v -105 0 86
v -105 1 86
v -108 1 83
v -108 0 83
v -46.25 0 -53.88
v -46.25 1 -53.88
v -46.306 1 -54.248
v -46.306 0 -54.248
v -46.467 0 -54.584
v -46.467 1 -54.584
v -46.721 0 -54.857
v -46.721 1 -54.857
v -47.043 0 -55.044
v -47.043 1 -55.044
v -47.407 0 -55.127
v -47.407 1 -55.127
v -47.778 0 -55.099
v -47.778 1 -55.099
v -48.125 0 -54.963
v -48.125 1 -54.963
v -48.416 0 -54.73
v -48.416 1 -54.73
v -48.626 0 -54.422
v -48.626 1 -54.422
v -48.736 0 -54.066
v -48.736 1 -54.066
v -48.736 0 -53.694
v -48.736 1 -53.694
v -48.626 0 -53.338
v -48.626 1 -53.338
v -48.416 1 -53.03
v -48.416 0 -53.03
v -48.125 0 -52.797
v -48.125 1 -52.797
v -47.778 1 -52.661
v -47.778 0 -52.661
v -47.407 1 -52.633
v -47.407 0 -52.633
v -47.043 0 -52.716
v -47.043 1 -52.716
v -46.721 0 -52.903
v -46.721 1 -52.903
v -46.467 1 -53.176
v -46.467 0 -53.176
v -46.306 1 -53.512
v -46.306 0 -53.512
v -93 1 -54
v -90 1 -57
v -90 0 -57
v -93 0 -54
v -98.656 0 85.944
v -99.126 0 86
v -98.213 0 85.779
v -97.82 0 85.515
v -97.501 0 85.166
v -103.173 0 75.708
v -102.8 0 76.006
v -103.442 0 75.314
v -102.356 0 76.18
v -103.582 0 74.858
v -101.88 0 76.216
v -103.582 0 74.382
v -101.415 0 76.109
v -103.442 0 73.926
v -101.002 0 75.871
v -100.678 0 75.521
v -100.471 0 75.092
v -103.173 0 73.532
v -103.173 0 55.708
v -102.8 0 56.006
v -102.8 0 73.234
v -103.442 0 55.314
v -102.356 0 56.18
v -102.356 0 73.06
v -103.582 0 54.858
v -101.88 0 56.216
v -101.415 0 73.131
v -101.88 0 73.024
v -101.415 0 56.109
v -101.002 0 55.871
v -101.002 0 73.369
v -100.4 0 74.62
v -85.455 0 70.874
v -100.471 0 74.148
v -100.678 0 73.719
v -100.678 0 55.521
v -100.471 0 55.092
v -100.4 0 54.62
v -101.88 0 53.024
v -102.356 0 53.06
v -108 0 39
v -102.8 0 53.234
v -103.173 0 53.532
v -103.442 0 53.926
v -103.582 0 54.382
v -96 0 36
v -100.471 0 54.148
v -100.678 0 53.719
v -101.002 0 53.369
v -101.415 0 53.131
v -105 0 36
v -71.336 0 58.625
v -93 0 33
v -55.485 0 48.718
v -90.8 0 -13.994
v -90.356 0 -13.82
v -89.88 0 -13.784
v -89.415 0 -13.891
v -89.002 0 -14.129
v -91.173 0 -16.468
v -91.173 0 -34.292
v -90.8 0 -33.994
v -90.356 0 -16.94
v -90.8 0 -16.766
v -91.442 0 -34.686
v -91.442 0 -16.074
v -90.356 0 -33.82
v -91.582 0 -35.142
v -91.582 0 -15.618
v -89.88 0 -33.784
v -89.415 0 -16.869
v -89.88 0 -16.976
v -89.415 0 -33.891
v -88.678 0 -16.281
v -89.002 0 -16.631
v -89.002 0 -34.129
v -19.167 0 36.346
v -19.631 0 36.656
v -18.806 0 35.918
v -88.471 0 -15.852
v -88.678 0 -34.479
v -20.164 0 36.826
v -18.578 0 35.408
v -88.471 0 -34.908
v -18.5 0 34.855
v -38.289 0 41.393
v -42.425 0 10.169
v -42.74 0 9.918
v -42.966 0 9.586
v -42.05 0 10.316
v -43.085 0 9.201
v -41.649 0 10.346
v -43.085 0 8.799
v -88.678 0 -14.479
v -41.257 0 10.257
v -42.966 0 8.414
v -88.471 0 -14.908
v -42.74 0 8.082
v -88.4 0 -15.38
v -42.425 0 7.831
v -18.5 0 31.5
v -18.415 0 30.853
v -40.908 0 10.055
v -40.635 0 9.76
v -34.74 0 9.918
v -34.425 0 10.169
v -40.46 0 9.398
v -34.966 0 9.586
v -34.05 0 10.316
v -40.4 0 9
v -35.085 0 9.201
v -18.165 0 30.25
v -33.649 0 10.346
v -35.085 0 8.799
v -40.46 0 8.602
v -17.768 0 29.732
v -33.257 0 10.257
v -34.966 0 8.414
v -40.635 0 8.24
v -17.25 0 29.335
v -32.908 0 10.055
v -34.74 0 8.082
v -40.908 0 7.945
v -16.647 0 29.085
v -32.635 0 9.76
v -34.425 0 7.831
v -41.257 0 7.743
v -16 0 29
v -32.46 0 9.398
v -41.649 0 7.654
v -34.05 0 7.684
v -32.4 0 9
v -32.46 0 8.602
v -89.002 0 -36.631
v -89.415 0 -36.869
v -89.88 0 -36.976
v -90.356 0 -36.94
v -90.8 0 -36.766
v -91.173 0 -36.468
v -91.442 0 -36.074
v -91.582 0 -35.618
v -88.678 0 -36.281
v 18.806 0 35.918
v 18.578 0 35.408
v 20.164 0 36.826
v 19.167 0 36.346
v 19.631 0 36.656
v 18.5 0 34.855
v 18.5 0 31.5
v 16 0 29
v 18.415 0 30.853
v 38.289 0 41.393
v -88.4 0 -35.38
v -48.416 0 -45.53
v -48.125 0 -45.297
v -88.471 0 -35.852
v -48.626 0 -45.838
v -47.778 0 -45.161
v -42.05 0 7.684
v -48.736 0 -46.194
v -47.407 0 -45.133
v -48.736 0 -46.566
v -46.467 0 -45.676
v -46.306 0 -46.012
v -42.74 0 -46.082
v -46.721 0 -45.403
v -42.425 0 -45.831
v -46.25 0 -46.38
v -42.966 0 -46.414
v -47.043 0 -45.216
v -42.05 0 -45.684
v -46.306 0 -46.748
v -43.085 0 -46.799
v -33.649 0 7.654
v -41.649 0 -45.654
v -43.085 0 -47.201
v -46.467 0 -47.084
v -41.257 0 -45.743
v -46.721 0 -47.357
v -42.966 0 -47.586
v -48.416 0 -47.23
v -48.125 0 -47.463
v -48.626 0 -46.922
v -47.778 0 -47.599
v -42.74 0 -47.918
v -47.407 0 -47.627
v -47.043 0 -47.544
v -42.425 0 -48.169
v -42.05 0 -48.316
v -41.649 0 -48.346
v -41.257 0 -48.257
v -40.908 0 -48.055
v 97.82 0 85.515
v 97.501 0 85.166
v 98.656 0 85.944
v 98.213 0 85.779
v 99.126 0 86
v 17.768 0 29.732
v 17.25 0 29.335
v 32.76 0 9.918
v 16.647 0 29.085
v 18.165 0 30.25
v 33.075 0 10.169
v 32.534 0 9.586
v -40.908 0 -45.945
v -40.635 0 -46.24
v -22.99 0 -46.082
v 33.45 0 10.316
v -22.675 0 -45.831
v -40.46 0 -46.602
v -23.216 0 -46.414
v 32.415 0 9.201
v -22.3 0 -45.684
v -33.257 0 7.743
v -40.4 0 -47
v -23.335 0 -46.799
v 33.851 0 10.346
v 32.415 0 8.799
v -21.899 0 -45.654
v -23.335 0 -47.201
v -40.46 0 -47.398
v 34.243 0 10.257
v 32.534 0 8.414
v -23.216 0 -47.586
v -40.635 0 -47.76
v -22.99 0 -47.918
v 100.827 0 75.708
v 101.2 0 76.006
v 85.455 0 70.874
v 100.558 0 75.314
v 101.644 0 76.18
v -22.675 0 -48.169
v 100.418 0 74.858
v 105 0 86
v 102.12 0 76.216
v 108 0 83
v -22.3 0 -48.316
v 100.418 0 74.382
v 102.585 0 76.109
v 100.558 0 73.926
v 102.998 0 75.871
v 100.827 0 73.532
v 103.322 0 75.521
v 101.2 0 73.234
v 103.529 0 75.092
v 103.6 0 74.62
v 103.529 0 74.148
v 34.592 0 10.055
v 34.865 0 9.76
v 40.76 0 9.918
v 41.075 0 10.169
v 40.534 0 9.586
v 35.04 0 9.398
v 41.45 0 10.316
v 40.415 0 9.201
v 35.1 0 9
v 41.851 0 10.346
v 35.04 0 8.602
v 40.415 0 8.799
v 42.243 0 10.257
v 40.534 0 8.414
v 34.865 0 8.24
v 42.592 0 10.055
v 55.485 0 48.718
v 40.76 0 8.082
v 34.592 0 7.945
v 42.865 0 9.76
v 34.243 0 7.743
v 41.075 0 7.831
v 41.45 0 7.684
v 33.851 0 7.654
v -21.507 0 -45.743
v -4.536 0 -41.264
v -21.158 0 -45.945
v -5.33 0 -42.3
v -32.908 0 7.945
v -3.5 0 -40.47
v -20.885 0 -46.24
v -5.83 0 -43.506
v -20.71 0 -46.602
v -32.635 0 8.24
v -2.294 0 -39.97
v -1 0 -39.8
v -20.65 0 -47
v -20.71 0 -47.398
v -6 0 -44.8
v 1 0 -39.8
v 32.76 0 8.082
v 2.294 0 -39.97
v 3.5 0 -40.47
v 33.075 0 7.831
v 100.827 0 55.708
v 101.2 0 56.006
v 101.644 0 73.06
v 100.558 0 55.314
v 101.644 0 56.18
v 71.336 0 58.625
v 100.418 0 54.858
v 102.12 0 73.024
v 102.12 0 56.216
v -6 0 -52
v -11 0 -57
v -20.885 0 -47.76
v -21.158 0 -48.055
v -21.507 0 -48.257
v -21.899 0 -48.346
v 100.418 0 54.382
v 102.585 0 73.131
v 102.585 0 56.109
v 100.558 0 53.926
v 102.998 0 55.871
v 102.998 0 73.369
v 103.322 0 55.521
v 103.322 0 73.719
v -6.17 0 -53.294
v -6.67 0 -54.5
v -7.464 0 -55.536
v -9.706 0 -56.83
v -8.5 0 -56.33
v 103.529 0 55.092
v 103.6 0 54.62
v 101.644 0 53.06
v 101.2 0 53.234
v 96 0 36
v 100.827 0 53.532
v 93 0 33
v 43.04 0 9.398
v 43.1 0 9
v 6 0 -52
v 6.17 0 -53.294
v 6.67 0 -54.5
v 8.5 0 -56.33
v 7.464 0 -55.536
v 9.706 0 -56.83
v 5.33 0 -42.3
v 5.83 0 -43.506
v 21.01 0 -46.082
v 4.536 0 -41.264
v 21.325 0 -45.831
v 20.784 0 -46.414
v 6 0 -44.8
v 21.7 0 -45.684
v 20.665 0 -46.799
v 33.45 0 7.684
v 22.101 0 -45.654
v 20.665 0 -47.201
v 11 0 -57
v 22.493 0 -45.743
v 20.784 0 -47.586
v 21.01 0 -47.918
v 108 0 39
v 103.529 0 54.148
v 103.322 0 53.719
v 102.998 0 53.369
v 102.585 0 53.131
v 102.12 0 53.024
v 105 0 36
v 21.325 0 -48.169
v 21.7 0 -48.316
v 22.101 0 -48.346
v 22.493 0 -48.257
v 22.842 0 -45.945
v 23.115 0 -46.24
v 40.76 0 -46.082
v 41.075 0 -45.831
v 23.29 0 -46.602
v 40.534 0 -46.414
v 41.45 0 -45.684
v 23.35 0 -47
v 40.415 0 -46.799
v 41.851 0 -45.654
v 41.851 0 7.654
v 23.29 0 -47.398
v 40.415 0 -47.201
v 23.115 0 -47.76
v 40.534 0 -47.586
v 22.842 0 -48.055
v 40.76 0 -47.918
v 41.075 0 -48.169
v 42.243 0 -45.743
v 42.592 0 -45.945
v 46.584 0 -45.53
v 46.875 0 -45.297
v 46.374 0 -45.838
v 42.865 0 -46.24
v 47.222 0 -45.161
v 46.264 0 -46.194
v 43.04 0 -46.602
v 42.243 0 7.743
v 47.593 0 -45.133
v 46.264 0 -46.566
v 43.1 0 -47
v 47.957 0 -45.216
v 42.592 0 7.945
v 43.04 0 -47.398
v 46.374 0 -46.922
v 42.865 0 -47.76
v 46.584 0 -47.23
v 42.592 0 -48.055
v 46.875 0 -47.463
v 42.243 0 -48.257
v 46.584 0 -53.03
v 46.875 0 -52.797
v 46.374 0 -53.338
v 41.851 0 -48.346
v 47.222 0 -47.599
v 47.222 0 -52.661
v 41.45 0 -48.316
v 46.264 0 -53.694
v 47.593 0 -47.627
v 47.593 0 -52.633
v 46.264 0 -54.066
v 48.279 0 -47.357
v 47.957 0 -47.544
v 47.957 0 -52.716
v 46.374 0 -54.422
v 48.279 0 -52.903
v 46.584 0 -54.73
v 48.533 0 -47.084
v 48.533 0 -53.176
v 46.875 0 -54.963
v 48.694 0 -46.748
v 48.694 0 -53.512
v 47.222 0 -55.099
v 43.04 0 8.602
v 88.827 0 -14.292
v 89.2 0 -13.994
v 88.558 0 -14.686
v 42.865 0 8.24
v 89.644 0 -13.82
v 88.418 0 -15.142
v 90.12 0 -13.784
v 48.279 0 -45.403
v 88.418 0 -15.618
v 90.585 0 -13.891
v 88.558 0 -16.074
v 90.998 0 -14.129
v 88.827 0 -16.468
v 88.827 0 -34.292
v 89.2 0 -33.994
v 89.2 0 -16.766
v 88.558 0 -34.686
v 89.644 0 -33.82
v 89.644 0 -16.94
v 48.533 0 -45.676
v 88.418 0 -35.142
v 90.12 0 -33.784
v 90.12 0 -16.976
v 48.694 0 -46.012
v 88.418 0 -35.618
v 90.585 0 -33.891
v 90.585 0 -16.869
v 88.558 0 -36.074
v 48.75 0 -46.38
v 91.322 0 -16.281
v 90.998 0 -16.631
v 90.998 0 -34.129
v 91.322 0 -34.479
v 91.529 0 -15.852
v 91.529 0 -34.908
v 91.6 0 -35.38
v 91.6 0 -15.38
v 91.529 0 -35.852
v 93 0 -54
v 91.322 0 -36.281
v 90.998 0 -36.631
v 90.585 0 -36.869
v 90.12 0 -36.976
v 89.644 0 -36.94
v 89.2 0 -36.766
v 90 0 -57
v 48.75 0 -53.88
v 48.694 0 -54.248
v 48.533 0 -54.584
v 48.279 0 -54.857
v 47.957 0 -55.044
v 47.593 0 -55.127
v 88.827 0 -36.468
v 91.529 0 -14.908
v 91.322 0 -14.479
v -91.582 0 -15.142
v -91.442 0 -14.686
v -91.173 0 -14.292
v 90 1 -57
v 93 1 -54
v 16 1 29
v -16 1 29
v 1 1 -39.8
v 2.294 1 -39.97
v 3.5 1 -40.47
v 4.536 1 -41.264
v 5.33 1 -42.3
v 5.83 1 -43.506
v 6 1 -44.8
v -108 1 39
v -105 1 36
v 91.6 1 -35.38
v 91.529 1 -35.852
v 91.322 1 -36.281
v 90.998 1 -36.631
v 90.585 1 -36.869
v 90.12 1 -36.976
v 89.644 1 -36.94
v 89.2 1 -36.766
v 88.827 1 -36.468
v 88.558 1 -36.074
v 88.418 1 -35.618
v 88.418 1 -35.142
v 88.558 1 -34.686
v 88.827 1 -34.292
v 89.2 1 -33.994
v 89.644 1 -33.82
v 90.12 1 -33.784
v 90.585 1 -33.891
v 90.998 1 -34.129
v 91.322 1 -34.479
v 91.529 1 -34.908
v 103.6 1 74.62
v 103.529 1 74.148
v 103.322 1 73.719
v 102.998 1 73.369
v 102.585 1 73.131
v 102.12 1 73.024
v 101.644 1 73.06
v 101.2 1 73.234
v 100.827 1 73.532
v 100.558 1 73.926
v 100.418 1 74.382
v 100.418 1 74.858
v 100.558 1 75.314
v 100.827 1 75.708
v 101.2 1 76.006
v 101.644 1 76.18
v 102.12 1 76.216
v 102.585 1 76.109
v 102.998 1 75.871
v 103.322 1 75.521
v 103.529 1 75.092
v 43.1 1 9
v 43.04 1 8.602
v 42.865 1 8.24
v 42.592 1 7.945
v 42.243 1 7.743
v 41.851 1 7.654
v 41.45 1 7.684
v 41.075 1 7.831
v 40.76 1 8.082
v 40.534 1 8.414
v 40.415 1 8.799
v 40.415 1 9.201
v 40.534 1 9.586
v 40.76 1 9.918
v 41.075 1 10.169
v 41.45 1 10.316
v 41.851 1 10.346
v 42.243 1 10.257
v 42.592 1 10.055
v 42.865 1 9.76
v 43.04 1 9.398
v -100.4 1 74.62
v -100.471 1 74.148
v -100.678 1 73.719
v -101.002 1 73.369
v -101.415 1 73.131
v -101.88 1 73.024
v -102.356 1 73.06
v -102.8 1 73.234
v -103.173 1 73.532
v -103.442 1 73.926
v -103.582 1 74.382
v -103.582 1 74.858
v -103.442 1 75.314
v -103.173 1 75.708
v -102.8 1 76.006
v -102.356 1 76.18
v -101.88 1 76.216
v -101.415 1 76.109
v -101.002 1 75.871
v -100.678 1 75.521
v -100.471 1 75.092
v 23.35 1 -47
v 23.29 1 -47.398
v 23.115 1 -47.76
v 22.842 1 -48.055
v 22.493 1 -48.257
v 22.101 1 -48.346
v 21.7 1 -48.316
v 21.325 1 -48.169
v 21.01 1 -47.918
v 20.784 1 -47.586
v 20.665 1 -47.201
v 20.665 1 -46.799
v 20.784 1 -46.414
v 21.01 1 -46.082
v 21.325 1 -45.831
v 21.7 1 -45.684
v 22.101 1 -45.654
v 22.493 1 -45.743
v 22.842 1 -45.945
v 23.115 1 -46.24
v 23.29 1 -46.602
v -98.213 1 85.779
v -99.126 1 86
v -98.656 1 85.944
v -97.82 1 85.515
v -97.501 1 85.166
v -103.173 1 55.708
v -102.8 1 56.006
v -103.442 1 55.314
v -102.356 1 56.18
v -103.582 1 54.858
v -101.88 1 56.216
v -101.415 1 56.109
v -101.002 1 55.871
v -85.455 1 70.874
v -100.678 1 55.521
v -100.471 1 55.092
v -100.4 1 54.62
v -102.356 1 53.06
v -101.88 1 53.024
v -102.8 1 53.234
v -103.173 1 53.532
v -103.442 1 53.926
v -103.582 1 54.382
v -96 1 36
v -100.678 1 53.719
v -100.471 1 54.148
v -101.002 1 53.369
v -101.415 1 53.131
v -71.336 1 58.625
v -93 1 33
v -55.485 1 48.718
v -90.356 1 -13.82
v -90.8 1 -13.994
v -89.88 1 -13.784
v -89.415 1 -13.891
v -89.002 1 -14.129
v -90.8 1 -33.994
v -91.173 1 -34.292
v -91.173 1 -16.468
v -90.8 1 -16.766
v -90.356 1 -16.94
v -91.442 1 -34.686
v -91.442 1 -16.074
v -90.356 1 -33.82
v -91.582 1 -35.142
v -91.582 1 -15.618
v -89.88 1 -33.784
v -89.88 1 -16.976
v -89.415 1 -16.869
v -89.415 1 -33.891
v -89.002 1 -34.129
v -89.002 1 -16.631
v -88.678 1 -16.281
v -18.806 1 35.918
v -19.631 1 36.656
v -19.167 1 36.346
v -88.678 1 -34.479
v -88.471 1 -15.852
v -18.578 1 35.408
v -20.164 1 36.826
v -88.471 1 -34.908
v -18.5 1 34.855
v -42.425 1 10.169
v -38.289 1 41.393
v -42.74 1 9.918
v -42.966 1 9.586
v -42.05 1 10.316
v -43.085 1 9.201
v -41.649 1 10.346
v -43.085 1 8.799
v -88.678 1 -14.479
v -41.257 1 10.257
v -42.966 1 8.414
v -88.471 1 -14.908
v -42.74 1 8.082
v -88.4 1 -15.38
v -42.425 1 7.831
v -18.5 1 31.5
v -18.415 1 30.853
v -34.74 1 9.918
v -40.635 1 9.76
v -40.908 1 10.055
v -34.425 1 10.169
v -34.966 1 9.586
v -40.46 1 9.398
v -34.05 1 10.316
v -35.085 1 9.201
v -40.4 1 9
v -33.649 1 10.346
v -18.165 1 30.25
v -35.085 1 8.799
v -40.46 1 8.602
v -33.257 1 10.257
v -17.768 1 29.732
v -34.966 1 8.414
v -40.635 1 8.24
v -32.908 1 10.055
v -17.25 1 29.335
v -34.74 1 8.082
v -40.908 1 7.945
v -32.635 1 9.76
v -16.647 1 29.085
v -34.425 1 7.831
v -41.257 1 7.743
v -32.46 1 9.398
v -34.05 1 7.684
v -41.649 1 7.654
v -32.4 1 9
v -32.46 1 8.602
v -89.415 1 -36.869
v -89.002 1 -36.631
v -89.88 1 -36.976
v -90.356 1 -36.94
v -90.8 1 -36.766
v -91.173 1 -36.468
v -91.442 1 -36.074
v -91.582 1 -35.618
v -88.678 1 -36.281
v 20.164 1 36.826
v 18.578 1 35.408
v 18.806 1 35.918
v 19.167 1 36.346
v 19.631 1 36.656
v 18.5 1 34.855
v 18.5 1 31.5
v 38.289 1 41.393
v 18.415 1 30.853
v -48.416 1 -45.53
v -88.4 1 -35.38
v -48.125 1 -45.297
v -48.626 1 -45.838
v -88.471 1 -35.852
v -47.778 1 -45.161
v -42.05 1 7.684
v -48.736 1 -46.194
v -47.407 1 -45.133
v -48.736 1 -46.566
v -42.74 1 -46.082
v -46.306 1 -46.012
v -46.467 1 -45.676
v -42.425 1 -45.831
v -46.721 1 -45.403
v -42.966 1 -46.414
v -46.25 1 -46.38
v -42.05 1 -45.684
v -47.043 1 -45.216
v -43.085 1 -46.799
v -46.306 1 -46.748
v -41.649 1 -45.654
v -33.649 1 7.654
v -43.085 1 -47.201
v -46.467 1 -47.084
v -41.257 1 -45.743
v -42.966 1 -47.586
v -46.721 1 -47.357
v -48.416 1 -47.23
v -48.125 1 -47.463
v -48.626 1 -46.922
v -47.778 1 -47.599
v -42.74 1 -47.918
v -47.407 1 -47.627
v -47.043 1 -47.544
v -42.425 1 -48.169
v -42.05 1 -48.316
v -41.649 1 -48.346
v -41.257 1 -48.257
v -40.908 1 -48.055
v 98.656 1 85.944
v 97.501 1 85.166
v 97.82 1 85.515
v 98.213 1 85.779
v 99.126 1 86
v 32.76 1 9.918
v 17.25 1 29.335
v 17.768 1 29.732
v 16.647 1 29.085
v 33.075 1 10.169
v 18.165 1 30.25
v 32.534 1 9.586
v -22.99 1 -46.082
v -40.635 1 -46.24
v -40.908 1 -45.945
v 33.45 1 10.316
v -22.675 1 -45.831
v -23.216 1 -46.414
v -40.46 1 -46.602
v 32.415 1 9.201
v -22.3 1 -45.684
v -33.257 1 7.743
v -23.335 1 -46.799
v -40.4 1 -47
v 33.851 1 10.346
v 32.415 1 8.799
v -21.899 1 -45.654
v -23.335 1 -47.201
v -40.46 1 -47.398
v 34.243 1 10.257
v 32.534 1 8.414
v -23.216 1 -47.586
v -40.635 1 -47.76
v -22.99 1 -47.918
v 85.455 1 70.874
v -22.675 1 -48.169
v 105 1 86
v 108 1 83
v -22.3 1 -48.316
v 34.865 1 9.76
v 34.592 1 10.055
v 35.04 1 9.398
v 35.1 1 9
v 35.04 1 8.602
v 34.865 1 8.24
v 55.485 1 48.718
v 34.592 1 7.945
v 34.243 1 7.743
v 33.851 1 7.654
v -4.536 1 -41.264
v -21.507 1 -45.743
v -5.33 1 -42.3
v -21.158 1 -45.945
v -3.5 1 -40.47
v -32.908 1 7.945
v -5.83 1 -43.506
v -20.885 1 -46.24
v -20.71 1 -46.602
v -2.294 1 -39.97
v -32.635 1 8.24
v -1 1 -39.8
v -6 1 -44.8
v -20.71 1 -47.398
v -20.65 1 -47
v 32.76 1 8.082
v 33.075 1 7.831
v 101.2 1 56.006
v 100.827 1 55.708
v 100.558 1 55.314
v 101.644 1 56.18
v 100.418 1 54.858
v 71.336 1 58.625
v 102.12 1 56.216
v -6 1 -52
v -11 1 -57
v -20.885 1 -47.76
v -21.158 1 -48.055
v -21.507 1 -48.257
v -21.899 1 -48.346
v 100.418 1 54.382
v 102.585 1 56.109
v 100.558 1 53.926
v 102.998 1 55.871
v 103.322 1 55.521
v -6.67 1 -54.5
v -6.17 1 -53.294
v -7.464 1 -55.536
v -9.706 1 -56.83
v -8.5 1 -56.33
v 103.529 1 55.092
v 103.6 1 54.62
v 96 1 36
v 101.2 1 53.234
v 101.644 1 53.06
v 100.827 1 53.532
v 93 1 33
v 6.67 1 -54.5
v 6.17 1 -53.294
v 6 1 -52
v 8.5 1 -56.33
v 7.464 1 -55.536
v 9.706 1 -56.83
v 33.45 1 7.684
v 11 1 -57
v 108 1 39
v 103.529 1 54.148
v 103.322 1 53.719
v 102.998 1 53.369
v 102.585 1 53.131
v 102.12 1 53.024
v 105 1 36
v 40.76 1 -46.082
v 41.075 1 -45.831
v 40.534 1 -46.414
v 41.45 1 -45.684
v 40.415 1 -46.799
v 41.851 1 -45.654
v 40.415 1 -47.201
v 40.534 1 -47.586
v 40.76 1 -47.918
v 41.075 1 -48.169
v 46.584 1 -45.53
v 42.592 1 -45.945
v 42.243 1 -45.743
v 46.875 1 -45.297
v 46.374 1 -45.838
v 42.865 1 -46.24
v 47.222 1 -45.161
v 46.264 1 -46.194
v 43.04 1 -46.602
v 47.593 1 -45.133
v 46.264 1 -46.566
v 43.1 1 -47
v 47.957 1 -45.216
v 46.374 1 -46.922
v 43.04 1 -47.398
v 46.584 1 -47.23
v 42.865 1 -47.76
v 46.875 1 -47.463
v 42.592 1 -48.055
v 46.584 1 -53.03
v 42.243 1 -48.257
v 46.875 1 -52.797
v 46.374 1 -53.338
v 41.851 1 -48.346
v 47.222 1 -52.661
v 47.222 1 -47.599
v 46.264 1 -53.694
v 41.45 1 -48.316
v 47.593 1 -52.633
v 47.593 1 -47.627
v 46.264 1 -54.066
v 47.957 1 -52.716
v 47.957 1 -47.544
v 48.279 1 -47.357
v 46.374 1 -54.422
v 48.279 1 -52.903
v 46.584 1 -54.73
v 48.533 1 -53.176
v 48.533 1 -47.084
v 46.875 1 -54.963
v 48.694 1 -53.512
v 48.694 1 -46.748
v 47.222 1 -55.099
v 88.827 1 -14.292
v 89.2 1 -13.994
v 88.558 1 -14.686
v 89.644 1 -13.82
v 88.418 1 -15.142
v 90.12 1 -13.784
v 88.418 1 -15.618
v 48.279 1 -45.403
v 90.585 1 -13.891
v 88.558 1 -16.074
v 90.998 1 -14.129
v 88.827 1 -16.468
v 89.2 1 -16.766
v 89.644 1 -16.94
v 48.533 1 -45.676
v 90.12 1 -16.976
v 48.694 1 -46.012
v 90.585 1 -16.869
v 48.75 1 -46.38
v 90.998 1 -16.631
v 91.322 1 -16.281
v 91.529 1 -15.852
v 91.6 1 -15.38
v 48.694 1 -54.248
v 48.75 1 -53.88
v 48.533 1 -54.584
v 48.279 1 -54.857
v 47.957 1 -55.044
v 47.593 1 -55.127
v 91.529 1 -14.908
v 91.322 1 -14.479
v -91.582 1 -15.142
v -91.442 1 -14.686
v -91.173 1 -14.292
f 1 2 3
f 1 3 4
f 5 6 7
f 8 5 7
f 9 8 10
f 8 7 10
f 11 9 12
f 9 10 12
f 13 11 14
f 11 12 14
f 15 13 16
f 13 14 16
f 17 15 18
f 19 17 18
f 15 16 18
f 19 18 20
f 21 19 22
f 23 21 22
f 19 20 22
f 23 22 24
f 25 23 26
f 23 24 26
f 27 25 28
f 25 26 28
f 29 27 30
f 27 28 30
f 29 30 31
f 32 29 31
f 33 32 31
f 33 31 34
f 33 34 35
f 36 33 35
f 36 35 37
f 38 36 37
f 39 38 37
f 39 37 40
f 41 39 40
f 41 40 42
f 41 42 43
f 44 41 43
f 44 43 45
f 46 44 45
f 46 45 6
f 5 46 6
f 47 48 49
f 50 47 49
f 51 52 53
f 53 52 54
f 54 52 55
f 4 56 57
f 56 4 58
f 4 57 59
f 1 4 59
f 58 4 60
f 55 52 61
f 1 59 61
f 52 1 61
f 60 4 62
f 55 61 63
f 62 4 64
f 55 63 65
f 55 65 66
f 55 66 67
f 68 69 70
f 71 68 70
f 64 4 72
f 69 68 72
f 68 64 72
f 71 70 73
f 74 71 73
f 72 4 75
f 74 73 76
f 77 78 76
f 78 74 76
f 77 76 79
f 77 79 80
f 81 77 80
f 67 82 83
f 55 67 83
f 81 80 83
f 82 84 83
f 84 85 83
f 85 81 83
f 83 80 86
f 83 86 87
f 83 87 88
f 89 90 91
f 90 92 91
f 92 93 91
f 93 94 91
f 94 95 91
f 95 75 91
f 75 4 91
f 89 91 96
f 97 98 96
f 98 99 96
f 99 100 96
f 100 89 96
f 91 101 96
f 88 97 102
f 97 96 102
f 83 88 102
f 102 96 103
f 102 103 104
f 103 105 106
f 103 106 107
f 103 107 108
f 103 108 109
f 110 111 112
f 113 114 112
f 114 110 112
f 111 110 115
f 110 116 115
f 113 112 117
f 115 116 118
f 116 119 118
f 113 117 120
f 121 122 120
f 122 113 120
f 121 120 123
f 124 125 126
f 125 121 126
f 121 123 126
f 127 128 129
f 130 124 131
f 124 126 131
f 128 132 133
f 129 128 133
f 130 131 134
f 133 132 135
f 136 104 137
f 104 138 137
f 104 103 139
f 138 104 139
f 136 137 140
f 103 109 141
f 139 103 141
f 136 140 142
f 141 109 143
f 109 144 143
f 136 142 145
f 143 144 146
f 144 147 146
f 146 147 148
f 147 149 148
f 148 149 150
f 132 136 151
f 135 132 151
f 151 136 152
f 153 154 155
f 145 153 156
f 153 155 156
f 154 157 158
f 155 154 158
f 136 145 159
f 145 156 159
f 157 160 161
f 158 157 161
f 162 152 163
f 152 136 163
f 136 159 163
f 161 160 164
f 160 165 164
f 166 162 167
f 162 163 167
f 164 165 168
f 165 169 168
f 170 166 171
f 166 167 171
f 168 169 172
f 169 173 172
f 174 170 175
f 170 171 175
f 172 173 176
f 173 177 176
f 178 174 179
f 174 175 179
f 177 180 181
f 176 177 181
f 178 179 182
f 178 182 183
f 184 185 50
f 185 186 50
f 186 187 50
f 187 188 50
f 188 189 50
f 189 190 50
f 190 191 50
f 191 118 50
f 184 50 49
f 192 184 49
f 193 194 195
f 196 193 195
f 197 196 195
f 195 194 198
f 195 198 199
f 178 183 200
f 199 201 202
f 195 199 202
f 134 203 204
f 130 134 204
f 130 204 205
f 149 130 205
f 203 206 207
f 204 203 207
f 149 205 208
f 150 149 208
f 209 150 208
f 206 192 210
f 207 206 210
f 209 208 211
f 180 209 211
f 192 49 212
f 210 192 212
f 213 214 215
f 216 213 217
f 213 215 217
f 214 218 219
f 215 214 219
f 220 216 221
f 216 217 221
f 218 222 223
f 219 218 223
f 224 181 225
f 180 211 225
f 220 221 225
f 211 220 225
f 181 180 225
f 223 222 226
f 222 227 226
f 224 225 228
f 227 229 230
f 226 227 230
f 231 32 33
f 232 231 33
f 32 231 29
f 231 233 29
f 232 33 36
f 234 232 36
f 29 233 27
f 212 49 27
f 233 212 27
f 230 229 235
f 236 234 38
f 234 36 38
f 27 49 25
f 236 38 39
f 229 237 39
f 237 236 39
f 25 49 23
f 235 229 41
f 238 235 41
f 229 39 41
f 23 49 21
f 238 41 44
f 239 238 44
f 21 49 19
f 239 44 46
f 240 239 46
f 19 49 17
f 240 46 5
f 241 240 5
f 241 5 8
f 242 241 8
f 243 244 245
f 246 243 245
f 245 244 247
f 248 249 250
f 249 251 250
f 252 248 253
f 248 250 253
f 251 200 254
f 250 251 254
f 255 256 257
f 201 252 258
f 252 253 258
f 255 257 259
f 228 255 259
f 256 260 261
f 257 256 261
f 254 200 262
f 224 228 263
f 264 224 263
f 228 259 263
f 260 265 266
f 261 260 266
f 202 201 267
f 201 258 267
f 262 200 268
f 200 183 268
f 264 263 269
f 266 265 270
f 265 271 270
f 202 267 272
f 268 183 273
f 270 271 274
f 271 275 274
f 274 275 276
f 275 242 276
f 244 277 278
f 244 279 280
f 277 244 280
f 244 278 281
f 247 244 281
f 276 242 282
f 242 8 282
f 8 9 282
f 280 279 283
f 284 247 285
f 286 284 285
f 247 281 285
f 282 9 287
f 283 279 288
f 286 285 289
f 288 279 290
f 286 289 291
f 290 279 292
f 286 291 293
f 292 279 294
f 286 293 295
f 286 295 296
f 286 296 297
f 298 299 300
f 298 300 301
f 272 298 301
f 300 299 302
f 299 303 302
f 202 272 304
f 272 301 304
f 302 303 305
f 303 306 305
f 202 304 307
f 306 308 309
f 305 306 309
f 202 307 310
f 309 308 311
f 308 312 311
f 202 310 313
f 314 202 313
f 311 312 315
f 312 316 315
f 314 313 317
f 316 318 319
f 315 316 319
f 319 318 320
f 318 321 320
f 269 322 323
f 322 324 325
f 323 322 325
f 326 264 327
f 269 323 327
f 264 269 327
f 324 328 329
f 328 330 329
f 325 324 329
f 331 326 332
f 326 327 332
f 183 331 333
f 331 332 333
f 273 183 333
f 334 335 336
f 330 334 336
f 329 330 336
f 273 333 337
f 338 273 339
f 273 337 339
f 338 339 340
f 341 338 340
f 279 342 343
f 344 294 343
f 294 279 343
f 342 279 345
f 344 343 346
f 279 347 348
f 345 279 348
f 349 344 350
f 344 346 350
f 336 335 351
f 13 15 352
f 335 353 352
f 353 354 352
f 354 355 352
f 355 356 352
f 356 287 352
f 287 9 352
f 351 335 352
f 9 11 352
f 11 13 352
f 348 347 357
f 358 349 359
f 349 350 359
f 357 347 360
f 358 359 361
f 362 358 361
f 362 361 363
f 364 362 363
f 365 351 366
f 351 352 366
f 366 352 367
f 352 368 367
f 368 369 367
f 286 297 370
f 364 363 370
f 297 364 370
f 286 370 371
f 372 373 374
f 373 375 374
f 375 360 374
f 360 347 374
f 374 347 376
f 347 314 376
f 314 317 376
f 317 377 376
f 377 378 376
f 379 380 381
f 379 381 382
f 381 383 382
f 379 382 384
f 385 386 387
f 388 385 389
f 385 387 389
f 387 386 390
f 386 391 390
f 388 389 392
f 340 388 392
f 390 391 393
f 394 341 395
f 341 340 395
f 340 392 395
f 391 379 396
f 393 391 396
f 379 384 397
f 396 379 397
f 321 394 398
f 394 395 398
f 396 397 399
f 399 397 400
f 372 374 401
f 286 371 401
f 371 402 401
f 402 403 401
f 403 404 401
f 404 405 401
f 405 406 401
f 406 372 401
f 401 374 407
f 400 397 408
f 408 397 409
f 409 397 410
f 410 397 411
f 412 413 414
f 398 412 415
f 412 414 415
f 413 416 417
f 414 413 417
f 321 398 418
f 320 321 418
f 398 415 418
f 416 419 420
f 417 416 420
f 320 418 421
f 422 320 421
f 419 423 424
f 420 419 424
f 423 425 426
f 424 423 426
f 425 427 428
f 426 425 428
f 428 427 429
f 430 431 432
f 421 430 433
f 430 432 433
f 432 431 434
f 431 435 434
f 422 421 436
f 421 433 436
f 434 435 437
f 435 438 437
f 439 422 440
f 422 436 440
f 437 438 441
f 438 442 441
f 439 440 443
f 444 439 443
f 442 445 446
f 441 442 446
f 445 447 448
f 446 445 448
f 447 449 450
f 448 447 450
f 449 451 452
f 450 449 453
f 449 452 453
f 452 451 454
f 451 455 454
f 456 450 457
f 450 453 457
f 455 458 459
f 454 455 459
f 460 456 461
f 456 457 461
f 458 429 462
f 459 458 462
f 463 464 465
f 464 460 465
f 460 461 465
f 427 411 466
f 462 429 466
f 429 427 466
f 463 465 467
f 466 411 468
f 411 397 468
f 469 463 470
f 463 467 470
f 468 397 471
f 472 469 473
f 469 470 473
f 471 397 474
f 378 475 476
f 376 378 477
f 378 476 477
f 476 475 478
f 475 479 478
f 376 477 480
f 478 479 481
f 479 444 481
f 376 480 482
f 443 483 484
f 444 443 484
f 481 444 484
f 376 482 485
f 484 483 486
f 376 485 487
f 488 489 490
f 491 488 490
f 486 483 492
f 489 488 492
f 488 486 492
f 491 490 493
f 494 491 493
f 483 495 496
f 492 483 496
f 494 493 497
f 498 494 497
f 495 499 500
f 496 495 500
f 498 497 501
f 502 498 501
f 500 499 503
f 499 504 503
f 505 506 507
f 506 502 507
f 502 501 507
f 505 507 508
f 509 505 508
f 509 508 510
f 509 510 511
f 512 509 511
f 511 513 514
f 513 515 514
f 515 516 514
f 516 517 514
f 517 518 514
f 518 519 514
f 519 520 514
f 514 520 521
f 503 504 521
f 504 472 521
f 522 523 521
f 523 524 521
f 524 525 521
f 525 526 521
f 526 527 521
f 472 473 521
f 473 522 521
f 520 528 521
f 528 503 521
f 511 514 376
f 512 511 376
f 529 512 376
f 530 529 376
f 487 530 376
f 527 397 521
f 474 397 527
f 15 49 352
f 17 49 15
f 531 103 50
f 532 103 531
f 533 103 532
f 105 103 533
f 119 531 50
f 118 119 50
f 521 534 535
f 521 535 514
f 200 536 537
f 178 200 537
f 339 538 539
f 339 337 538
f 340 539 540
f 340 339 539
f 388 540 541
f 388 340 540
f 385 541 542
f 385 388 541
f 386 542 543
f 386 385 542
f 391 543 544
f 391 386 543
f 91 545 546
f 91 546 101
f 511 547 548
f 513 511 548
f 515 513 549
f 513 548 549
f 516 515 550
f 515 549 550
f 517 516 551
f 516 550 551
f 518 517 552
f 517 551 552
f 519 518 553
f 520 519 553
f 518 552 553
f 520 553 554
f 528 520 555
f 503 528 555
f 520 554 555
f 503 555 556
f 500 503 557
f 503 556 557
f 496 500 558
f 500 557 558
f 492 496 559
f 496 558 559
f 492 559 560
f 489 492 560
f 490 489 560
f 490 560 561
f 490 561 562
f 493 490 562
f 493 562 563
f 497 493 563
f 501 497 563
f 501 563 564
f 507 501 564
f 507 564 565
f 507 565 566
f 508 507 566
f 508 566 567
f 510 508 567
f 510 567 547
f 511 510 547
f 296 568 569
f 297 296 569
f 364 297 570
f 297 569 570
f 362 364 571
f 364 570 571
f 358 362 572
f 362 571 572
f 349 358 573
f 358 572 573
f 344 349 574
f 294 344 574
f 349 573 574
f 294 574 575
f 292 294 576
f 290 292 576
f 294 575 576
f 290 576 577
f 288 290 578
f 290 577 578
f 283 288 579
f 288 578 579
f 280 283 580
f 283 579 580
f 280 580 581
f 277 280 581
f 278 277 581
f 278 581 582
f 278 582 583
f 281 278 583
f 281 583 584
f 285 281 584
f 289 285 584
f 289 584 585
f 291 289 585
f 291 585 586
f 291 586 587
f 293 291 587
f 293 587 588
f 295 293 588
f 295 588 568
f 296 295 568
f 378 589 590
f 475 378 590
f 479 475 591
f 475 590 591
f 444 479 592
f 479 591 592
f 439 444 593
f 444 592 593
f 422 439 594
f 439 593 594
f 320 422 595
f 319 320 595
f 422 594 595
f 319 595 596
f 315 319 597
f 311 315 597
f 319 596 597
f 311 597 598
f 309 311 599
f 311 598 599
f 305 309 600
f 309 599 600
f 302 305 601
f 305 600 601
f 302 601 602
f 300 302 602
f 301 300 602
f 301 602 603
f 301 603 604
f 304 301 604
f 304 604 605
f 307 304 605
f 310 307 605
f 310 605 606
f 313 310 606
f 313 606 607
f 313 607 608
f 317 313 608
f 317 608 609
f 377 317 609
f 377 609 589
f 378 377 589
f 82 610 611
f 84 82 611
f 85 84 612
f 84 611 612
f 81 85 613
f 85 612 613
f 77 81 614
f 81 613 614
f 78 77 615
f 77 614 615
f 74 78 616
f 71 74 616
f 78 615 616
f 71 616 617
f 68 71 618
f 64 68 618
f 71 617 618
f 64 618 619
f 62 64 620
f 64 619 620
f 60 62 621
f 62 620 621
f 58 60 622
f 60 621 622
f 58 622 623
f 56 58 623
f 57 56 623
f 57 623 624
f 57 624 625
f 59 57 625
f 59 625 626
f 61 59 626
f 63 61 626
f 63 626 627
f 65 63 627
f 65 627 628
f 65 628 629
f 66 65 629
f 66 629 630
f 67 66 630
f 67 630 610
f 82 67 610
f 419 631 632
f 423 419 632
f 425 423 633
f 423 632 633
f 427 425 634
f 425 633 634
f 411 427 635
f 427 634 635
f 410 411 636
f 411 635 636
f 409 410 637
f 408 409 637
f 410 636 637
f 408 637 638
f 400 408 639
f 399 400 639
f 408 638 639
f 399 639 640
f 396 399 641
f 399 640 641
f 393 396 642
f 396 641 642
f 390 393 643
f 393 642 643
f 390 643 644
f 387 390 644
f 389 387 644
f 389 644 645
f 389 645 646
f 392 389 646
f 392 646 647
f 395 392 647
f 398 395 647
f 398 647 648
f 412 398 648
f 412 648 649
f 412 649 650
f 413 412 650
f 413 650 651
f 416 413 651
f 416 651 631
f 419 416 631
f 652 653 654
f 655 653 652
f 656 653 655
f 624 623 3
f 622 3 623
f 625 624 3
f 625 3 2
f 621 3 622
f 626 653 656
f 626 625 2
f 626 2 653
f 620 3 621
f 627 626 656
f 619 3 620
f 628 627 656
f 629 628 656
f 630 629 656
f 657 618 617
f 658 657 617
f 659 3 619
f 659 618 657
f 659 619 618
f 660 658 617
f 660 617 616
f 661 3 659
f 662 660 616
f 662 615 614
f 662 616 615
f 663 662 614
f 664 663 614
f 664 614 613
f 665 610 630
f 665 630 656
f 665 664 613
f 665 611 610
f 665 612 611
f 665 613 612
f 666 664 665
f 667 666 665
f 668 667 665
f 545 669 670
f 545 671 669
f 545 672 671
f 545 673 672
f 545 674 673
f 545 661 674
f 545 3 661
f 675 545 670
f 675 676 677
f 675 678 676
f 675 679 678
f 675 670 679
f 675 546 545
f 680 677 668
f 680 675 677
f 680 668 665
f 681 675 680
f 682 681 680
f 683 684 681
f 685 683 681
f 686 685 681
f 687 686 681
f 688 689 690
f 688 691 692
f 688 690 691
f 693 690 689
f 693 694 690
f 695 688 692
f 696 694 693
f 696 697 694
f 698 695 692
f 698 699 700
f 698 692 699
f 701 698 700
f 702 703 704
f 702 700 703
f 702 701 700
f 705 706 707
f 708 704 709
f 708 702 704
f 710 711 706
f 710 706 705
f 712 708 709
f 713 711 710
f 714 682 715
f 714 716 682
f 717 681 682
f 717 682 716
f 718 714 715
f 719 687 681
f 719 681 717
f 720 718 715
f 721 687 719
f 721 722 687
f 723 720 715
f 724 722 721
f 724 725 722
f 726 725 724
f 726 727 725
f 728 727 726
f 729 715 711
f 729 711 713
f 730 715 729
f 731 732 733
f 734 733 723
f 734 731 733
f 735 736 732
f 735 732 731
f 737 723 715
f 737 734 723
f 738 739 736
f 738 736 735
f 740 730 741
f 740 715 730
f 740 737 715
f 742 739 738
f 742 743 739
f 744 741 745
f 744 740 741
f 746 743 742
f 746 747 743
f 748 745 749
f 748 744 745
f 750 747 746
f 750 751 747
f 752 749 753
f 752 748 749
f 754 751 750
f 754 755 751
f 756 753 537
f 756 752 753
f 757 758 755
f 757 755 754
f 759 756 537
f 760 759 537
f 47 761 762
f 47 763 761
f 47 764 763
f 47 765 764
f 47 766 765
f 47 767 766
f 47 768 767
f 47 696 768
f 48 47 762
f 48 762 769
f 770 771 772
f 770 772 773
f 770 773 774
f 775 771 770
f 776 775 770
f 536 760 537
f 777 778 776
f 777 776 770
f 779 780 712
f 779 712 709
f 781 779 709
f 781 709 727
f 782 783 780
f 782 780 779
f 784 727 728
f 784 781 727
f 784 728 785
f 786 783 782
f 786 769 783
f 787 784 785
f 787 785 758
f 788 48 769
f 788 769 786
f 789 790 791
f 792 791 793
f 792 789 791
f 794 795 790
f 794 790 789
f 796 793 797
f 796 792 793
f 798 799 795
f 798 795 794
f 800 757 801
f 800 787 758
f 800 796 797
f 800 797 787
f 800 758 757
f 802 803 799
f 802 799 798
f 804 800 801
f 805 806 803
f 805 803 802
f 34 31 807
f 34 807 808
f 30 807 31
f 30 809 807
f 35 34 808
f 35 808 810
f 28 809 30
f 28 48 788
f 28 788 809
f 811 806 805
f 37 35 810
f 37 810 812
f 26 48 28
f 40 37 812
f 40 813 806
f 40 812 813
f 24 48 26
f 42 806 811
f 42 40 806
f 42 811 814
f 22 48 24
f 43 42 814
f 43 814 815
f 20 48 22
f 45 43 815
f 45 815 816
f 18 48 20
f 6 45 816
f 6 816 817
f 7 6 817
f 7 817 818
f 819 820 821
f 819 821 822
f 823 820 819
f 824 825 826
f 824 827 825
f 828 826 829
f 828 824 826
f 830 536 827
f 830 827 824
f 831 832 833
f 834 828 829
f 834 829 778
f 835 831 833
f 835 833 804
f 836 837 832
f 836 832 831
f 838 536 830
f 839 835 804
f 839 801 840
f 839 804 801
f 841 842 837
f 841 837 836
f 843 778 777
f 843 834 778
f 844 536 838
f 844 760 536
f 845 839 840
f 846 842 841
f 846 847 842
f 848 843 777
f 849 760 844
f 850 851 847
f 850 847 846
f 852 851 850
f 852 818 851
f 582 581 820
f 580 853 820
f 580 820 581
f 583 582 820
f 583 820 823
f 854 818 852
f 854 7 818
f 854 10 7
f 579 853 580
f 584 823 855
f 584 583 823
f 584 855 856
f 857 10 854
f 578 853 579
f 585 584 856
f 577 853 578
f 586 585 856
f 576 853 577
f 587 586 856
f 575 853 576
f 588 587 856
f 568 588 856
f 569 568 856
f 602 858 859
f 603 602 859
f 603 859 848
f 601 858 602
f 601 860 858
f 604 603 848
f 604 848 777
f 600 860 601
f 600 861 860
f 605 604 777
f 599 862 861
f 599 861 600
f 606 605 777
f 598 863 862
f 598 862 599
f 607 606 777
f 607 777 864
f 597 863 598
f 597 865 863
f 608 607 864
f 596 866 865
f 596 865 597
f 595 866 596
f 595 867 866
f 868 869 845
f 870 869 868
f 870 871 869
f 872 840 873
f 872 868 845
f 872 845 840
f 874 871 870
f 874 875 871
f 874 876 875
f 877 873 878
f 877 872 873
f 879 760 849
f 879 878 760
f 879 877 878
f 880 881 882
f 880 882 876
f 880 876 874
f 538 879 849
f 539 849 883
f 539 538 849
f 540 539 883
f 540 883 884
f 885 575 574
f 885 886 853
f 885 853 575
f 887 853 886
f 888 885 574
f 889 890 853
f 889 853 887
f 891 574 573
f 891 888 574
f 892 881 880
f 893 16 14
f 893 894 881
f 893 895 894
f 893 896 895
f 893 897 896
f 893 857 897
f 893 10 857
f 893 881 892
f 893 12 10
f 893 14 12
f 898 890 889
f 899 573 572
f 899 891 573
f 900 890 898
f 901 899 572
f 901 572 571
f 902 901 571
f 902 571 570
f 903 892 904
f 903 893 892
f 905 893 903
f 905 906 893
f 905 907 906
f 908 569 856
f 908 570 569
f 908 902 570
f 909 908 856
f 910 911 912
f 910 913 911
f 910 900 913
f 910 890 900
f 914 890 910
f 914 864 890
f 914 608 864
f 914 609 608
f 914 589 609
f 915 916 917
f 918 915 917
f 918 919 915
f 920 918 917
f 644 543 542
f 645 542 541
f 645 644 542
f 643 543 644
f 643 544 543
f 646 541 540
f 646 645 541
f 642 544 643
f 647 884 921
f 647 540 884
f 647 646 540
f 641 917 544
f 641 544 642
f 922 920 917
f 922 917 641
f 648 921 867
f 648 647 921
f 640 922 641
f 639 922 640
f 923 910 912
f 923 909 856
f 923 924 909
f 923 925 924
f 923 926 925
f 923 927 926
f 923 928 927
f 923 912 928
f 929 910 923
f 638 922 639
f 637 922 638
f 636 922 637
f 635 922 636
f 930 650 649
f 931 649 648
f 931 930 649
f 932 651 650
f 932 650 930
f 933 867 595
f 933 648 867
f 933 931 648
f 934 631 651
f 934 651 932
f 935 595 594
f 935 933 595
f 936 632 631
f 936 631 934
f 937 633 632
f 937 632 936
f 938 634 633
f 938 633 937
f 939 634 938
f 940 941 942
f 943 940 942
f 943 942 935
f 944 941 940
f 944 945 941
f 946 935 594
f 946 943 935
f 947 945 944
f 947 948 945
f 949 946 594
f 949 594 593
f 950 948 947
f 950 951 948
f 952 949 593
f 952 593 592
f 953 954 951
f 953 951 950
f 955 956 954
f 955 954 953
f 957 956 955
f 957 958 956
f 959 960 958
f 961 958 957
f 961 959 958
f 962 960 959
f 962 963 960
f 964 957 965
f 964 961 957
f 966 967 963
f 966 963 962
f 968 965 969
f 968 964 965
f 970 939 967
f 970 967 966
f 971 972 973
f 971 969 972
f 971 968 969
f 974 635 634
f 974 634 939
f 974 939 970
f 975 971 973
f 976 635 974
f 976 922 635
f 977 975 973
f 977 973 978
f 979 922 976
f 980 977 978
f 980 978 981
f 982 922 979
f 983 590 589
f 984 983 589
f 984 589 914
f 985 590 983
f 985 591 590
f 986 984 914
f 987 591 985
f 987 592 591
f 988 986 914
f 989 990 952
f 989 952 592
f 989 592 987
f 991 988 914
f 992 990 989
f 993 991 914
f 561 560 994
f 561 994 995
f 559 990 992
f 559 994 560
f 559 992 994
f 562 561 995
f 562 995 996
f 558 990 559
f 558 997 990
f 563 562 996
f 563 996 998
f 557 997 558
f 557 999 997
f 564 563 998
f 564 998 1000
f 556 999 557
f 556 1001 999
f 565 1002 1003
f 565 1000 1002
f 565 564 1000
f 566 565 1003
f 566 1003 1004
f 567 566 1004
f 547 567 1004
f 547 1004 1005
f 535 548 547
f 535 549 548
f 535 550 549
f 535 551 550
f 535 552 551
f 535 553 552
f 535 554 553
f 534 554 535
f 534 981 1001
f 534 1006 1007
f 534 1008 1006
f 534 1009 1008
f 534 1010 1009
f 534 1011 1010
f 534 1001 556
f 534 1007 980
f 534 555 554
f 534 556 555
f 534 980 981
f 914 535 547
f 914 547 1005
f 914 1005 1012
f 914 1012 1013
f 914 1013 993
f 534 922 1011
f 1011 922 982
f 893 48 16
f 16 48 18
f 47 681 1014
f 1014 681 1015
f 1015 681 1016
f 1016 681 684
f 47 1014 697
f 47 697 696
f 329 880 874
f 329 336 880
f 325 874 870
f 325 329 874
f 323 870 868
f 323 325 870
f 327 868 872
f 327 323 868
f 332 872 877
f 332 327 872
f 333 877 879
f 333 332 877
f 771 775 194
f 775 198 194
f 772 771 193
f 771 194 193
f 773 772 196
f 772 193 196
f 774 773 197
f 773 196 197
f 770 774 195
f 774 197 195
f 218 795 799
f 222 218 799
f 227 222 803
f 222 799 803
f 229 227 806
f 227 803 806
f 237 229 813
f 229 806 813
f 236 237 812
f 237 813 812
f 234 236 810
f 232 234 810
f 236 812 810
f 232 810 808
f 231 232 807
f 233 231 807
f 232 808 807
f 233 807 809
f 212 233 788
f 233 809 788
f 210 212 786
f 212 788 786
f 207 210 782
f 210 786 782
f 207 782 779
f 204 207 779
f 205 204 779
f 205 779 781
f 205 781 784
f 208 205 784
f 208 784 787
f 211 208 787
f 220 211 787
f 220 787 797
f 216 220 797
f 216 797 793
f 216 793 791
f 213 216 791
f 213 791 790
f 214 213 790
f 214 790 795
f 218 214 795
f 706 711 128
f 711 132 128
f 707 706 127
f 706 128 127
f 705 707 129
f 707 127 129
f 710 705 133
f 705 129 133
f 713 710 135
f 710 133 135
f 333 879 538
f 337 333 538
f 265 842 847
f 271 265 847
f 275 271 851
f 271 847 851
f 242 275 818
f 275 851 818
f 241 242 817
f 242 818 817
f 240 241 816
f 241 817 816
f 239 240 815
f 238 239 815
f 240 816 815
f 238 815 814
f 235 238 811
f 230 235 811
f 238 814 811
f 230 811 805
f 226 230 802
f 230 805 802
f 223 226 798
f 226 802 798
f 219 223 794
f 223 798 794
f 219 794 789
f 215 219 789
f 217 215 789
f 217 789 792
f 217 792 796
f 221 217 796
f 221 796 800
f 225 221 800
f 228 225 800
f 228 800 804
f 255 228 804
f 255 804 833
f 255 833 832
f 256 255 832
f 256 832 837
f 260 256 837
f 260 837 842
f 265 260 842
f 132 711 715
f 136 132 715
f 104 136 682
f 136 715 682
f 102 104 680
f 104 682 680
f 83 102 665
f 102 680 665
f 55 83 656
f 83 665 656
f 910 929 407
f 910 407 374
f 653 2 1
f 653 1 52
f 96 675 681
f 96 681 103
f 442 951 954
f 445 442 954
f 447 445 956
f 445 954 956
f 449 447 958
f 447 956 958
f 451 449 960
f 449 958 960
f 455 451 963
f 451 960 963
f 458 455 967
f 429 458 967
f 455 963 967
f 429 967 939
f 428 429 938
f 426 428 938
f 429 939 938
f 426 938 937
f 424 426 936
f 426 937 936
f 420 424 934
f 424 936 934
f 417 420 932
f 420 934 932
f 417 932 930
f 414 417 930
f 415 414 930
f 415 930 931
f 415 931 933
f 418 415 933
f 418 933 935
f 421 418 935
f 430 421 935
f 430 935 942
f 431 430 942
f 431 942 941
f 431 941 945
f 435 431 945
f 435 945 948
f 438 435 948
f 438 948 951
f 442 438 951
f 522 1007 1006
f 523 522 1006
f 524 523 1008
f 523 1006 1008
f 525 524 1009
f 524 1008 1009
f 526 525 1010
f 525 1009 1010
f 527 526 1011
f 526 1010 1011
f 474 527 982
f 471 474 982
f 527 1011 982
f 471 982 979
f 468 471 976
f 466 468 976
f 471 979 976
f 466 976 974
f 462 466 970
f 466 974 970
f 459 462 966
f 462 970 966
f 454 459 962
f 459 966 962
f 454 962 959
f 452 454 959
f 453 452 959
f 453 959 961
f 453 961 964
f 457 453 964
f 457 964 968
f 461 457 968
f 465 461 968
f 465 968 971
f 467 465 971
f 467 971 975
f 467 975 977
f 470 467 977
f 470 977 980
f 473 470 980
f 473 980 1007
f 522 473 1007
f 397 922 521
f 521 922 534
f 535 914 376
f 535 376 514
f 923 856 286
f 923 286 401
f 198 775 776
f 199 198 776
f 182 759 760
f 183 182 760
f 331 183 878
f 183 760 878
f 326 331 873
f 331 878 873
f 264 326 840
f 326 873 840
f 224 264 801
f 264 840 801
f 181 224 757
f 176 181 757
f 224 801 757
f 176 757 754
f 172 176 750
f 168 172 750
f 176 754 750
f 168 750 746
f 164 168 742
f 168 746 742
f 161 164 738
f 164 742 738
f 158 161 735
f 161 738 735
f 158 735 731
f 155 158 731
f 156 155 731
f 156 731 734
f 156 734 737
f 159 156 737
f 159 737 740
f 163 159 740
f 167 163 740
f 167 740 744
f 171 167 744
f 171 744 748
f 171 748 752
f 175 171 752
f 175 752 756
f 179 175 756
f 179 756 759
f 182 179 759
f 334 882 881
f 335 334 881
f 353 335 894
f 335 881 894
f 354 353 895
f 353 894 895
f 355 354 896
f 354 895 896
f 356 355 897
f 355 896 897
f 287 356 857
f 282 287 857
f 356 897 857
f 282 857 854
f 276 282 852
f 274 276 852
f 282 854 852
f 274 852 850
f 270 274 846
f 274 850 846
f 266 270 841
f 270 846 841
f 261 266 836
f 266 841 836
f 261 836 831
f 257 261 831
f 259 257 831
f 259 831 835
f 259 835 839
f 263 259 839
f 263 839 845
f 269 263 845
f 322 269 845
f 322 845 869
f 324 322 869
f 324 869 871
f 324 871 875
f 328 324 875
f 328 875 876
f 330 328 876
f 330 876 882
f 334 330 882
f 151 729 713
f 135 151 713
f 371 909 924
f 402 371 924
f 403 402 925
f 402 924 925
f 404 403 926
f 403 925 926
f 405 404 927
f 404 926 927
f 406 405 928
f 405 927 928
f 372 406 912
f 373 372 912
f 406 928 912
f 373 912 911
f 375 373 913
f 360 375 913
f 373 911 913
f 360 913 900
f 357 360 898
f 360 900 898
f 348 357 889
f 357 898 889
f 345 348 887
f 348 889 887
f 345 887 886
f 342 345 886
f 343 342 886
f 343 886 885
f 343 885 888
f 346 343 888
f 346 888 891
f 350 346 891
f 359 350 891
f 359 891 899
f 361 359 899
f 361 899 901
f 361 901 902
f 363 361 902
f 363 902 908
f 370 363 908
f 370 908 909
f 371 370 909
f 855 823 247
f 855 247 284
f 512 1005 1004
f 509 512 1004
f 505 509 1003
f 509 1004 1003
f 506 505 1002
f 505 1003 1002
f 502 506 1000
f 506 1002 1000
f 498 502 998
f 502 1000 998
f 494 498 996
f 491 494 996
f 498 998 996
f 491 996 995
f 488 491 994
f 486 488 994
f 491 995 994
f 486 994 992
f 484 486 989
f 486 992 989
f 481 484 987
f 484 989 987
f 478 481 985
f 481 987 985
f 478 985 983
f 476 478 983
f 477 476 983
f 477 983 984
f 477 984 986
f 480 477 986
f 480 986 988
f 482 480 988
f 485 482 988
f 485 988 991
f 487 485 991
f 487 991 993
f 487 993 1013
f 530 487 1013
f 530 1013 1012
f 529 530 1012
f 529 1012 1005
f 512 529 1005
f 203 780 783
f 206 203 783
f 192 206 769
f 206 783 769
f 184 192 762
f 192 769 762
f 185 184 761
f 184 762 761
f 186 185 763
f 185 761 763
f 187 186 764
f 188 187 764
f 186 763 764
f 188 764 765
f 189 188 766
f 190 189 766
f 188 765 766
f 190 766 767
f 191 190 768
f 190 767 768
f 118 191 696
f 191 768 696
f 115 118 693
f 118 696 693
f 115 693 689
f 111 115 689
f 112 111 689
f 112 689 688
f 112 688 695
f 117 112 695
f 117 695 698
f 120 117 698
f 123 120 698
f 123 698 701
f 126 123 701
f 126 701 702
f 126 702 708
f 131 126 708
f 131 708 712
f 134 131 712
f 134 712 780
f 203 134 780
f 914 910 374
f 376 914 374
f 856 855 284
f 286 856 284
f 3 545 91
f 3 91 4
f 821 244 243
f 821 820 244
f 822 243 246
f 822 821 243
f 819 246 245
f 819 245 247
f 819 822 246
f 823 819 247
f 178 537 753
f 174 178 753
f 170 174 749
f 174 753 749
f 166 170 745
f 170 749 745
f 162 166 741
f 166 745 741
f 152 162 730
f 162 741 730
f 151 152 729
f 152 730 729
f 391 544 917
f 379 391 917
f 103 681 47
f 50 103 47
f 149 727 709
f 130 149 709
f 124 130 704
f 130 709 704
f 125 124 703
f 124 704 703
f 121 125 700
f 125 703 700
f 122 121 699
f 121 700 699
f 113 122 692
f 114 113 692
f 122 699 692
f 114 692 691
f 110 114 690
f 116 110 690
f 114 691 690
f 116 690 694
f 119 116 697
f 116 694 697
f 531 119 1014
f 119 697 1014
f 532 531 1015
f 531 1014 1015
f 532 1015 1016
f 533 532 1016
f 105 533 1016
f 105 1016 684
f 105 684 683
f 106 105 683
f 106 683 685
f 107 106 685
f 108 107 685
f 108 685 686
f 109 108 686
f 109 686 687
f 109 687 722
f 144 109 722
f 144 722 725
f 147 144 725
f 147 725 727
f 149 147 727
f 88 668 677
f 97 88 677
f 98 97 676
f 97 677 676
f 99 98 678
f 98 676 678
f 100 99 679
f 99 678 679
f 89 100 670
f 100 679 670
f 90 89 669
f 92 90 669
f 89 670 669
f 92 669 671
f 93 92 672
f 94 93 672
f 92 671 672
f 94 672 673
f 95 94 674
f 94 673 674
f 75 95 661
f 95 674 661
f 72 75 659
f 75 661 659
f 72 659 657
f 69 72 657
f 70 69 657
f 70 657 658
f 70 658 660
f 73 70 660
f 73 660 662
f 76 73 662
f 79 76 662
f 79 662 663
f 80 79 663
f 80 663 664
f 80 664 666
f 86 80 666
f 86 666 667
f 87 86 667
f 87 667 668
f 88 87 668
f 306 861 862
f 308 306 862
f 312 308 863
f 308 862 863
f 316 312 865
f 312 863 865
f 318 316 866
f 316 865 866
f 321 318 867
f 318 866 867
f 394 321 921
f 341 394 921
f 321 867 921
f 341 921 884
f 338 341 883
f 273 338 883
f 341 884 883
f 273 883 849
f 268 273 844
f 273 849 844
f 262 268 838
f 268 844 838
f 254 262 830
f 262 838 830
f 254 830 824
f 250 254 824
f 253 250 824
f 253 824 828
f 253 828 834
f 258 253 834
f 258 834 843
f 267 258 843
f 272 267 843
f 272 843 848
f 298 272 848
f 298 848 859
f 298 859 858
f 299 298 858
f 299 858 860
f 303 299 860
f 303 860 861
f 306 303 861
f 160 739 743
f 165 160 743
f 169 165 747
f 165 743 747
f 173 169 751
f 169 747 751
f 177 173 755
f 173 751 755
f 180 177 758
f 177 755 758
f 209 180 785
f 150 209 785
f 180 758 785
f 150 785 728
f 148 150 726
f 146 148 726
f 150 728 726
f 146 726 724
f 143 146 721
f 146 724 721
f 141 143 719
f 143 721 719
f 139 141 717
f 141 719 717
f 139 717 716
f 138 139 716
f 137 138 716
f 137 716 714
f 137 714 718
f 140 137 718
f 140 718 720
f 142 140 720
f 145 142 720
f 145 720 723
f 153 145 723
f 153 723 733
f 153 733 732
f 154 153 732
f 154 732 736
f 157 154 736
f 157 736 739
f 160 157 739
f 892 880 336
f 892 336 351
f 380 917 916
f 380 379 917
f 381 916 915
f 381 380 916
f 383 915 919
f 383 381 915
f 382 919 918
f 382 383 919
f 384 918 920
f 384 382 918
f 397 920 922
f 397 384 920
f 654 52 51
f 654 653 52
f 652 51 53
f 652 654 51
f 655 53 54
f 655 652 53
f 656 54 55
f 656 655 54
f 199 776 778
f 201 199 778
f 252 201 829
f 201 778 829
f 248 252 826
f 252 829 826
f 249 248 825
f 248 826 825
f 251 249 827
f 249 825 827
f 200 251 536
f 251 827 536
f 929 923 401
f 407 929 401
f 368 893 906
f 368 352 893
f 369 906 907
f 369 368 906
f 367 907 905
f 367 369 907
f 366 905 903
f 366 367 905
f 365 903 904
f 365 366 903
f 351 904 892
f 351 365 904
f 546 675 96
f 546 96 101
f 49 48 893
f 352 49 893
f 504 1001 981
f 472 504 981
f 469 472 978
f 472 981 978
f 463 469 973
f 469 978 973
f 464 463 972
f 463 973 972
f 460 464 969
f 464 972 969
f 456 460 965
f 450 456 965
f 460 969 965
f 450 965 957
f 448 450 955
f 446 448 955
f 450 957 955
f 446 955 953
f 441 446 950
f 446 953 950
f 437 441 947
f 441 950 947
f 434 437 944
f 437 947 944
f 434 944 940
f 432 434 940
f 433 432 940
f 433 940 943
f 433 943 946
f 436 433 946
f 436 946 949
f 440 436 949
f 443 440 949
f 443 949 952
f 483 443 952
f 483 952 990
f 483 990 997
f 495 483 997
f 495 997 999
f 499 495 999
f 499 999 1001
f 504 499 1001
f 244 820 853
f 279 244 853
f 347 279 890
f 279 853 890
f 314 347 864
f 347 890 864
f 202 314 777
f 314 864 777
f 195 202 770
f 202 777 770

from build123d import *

# Parameters (mm, degrees)
SKETCH_1_W          = 186
SKETCH_1_H          = 110
EXTRUDE_1_DEPTH     = 1
SKETCH_2_R          = 1.6
CUT_EXTRUDE_1_DEPTH = 2
EXTRUDE_2_DEPTH     = 1
SKETCH_6_R          = 120
CUT_EXTRUDE_2_DEPTH = 2
SKETCH_8_W          = 186
SKETCH_8_H          = 2
EXTRUDE_3_DEPTH     = 1
SKETCH_7_R          = 1.25
SKETCH_7_R_2        = 1.6
CUT_EXTRUDE_3_DEPTH = 2
CHAMFER_1_SIZE      = 3
FILLET_1_R          = 2
CUT_EXTRUDE_4_DEPTH = 2
SKETCH_10_R         = 1.35
CUT_EXTRUDE_5_DEPTH = 2
SKETCH_11_W         = 12
SKETCH_11_H         = 17.2
CUT_EXTRUDE_6_DEPTH = 2
FILLET_2_R          = 5
FILLET_3_R          = 2


with BuildPart() as part:
    # 草图1 → 凸台-拉伸1 (new body)
    with BuildSketch(Plane(origin=(0, 0, 0), x_dir=(1, 0, 0), z_dir=(0, 1, 0))):
        Rectangle(SKETCH_1_W, SKETCH_1_H)
    extrude(amount=EXTRUDE_1_DEPTH)

    # 草图2 → 切除-拉伸1 (cut, through all)
    with BuildSketch(Plane(origin=(0, 1, 0), x_dir=(1, 0, 0), z_dir=(0, 1, 0))):
        with Locations((90, 15.38)):
            Circle(SKETCH_2_R)
        with Locations((90, 35.38)):
            Circle(SKETCH_2_R)
        with Locations((-90, 35.38)):
            Circle(SKETCH_2_R)
        with Locations((-90, 15.38)):
            Circle(SKETCH_2_R)
    extrude(amount=-CUT_EXTRUDE_1_DEPTH, mode=Mode.SUBTRACT)

    # 草图5 → 凸台-拉伸2 (add)
    with BuildSketch(Plane(origin=(0, 1, 0), x_dir=(1, 0, 0), z_dir=(0, 1, 0))):
        Polygon((-108, -86), (108, -86), (108, -36), (93, -36), (93, -55), (-93, -55), (-93, -36), (-108, -36), align=None)
    extrude(amount=-EXTRUDE_2_DEPTH)

    # 草图6 → 切除-拉伸2 (cut, through all)
    with BuildSketch(Plane(origin=(0, 1, 0), x_dir=(1, 0, 0), z_dir=(0, 1, 0))):
        with Locations((0, -155.12)):
            Circle(SKETCH_6_R)
    extrude(amount=-CUT_EXTRUDE_2_DEPTH, mode=Mode.SUBTRACT)

    # 草图8 → 凸台-拉伸3 (add)
    with BuildSketch(Plane(origin=(0, 1, 0), x_dir=(1, 0, 0), z_dir=(0, 1, 0))):
        with Locations((0, 56)):
            Rectangle(SKETCH_8_W, SKETCH_8_H)
    extrude(amount=-EXTRUDE_3_DEPTH)

    # 草图7 → 切除-拉伸3 (cut, through all)
    with BuildSketch(Plane(origin=(0, 1, 0), x_dir=(1, 0, 0), z_dir=(0, 1, 0))):
        with Locations((47.5, 46.38)):
            Circle(SKETCH_7_R)
        with Locations((47.5, 53.88)):
            Circle(SKETCH_7_R)
        with Locations((102, -74.62)):
            Circle(SKETCH_7_R_2)
        with Locations((102, -54.62)):
            Circle(SKETCH_7_R_2)
        with Locations((-102, -54.62)):
            Circle(SKETCH_7_R_2)
        with Locations((-102, -74.62)):
            Circle(SKETCH_7_R_2)
        with Locations((-47.5, 53.88)):
            Circle(SKETCH_7_R)
        with Locations((-47.5, 46.38)):
            Circle(SKETCH_7_R)
    extrude(amount=-CUT_EXTRUDE_3_DEPTH, mode=Mode.SUBTRACT)

    # 倒角1
    chamfer_1_edges = [part.edges().sort_by_distance(p)[0] for p in [
        (-93, 0.5, 36),
        (93, 0.5, 36),
        (108, 0.5, 36),
        (108, 0.5, 86),
        (-108, 0.5, 86),
        (-108, 0.5, 36),
        (93, 0.5, -57),
        (-93, 0.5, -57),
    ]]
    chamfer(chamfer_1_edges, length=CHAMFER_1_SIZE)

    # 圆角1
    fillet_1_edges = [part.edges().sort_by_distance(p)[0] for p in [
        (-98.093963117, 0.5, 86),
        (98.093963117, 0.5, 86),
    ]]
    fillet(fillet_1_edges, radius=FILLET_1_R)

    # 草图9 → 切除-拉伸4 (cut, through all)
    with BuildSketch(Plane(origin=(0, 1, 0), x_dir=(1, 0, 0), z_dir=(0, 1, 0))):
        with BuildLine():
            Line((16, -29), (-16, -29))
            ThreePointArc((-16, -29), (-17.767766953, -29.732233047), (-18.5, -31.5))
            Line((-18.5, -31.5), (-18.5, -36.554617194))
            ThreePointArc((-18.5, -36.554617194), (0, -35.12), (18.5, -36.554617194))
            Line((18.5, -36.554617194), (18.5, -31.5))
            ThreePointArc((18.5, -31.5), (17.767766953, -29.732233047), (16, -29))
        make_face()
    extrude(amount=-CUT_EXTRUDE_4_DEPTH, mode=Mode.SUBTRACT)

    # 草图10 → 切除-拉伸5 (cut, through all)
    with BuildSketch(Plane(origin=(0, 1, 0), x_dir=(1, 0, 0), z_dir=(0, 1, 0))):
        with Locations((-33.75, -9)):
            Circle(SKETCH_10_R)
        with Locations((-22, 47)):
            Circle(SKETCH_10_R)
        with Locations((22, 47)):
            Circle(SKETCH_10_R)
        with Locations((33.75, -9)):
            Circle(SKETCH_10_R)
        with Locations((41.75, -9)):
            Circle(SKETCH_10_R)
        with Locations((-41.75, -9)):
            Circle(SKETCH_10_R)
        with Locations((41.75, 47)):
            Circle(SKETCH_10_R)
        with Locations((-41.75, 47)):
            Circle(SKETCH_10_R)
    extrude(amount=-CUT_EXTRUDE_5_DEPTH, mode=Mode.SUBTRACT)

    # 草图11 → 切除-拉伸6 (cut, through all)
    with BuildSketch(Plane(origin=(0, 1, 0), x_dir=(1, 0, 0), z_dir=(0, 1, 0))):
        with Locations((0, 48.4)):
            Rectangle(SKETCH_11_W, SKETCH_11_H)
    extrude(amount=-CUT_EXTRUDE_6_DEPTH, mode=Mode.SUBTRACT)

    # 圆角2
    fillet_2_edges = [part.edges().sort_by_distance(p)[0] for p in [
        (6, 0.5, -39.8),
        (-6, 0.5, -39.8),
        (-6, 0.5, -57),
        (6, 0.5, -57),
    ]]
    fillet(fillet_2_edges, radius=FILLET_2_R)

    # 圆角3
    fillet_3_edges = [part.edges().sort_by_distance(p)[0] for p in [
        (18.5, 0.5, 36.554617194),
        (-18.5, 0.5, 36.554617194),
    ]]
    fillet(fillet_3_edges, radius=FILLET_3_R)


solid = part.part
